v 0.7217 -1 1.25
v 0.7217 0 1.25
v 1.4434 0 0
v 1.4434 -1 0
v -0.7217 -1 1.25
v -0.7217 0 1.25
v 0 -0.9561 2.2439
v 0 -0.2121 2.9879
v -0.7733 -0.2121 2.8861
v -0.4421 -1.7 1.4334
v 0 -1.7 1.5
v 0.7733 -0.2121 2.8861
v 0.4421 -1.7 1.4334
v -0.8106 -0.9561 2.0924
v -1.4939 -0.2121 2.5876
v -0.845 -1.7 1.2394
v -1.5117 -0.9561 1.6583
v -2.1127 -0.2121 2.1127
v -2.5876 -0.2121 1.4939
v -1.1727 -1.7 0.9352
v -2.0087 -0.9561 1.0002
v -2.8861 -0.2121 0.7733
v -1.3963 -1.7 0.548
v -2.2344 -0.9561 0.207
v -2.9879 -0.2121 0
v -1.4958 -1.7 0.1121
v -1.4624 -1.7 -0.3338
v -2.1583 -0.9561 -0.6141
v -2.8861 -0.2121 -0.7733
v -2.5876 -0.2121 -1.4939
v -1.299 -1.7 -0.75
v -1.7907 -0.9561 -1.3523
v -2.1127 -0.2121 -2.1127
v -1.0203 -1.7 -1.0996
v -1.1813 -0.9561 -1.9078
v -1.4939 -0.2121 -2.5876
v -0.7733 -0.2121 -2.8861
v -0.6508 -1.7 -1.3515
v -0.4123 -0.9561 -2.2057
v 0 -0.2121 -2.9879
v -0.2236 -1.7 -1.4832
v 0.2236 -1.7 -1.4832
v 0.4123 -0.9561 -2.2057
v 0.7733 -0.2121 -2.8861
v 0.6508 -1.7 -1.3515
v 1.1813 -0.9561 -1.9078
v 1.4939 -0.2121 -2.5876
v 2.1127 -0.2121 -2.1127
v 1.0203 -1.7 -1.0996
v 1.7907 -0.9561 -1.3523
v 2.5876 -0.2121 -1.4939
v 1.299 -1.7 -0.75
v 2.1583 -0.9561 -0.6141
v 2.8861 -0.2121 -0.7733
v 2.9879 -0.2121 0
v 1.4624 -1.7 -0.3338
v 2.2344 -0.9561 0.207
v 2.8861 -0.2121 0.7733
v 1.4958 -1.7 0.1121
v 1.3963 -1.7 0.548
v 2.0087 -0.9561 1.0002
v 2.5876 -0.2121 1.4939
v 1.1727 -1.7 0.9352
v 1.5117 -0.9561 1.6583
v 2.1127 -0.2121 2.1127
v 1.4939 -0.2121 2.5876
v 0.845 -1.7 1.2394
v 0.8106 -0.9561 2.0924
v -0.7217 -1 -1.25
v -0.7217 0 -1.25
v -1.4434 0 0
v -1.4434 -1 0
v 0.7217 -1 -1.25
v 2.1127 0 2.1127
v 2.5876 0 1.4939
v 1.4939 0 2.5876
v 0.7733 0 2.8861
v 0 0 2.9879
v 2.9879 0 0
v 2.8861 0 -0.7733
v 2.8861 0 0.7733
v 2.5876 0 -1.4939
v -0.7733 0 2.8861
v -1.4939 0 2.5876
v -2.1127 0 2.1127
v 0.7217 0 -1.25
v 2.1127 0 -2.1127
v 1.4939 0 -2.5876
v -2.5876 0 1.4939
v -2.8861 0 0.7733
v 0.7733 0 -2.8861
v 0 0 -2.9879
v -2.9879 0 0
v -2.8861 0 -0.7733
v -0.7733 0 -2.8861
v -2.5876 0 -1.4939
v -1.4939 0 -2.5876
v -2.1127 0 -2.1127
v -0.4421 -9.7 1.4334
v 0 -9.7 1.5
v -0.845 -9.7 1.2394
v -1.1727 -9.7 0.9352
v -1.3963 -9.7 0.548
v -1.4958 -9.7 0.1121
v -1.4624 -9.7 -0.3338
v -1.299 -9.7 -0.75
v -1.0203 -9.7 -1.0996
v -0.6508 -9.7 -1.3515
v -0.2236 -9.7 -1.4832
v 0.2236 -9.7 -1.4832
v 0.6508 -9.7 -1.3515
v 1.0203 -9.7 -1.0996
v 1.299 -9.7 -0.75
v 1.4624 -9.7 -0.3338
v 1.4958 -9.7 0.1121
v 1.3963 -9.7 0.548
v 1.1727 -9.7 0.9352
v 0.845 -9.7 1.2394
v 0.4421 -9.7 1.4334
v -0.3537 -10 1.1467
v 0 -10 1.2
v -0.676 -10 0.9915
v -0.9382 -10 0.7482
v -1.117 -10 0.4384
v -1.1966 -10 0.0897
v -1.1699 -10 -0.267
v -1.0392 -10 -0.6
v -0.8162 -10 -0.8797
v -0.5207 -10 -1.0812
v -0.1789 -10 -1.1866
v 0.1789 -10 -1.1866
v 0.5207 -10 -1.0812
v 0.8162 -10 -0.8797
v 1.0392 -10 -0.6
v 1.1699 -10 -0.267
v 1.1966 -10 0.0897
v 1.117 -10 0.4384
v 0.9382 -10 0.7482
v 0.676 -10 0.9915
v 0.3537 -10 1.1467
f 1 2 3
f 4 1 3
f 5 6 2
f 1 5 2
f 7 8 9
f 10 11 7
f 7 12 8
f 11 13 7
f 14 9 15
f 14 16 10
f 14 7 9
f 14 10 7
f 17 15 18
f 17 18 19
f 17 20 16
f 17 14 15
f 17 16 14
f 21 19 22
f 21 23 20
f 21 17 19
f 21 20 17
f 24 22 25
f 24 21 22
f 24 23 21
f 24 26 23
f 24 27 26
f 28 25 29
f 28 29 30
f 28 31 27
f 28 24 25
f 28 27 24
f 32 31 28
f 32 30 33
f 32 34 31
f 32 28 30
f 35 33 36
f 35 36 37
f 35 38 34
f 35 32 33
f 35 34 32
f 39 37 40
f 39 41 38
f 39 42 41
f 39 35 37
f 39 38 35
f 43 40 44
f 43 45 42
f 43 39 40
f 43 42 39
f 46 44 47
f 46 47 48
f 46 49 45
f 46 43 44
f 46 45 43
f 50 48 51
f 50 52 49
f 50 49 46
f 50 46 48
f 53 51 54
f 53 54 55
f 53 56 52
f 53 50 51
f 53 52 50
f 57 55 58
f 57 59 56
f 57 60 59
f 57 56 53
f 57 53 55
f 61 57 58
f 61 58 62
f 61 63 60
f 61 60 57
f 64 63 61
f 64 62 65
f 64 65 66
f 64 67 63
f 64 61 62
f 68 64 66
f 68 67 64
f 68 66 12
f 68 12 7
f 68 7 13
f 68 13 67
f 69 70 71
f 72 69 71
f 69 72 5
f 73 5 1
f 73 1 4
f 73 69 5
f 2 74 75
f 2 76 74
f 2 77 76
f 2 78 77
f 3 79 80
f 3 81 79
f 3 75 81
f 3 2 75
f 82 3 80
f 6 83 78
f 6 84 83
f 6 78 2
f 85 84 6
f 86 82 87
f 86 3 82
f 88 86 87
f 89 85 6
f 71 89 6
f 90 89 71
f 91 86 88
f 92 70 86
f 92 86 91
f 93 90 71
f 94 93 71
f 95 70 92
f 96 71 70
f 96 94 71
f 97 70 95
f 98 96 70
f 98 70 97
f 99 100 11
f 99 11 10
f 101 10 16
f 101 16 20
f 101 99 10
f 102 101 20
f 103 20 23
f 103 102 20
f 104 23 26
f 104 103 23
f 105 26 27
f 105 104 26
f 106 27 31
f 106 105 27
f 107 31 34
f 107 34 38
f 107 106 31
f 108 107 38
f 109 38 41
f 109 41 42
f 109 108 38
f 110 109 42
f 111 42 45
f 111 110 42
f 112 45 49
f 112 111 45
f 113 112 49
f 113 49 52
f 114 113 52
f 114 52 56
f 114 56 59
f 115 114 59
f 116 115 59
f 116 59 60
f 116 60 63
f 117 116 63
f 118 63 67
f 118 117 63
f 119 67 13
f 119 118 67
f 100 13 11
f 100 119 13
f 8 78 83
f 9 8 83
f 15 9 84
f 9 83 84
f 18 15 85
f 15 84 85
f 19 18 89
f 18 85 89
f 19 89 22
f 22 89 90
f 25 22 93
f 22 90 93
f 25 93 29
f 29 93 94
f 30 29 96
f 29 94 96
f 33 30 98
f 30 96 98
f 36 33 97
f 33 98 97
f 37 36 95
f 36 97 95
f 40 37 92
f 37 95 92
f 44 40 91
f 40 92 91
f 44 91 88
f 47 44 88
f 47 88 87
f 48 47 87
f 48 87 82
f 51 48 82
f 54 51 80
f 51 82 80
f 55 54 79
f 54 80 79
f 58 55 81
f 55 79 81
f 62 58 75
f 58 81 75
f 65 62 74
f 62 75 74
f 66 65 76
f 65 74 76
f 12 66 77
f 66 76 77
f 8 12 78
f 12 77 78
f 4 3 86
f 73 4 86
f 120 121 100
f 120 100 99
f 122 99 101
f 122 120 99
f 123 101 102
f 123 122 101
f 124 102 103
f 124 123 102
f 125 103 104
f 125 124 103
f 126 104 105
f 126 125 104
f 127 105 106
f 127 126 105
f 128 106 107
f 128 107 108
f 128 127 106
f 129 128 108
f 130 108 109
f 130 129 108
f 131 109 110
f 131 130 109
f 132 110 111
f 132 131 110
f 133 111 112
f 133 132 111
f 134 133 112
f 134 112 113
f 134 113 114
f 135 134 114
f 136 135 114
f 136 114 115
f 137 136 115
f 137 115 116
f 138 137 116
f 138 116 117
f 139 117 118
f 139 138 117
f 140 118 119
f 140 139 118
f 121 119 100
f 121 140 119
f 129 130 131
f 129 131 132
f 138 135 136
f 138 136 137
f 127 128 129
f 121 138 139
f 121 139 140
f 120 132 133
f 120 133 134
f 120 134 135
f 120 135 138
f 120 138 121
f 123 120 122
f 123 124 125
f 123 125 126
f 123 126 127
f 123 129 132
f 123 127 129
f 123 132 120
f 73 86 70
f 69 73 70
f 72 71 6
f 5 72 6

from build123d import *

# Parameters (mm, degrees)
CHAFL_N2_SIZE         = 0.3
CHAFL_N2_SIZE2        = 0.212132034
CHAFL_N3_SIZE         = 0.3
CORTAR_EXTRUIR2_DEPTH = 1


with BuildPart() as part:
    # Croquis1 → Revolución1 (revolve)
    with BuildSketch(Plane.XY, mode=Mode.PRIVATE) as revoluci_n1_sk:
        Polygon((0, 0), (3.2, 0), (1.5, -1.7), (1.5, -10), (0, -10), align=None)
    revolve(revoluci_n1_sk.sketch.rotate(Axis((0, 0, 0), (0, -1, 0)), 90), axis=Axis((0, 0, 0), (0, -1, 0)))

    # Chaflán2
    chafl_n2_edges = [part.edges().sort_by_distance(p)[0] for p in [
        (0, 0, -3.2),
    ]]
    chafl_n2_side = [part.faces().sort_by_distance(p)[0] for p in [
        (0, -0.85, -2.35),
    ]]
    chamfer(chafl_n2_edges, length=CHAFL_N2_SIZE, length2=CHAFL_N2_SIZE2, reference=chafl_n2_side[0])

    # Chaflán3
    chafl_n3_edges = [part.edges().sort_by_distance(p)[0] for p in [
        (0, -10, -1.5),
    ]]
    chamfer(chafl_n3_edges, length=CHAFL_N3_SIZE)

    # Croquis3 → Cortar-Extruir2 (cut)
    with BuildSketch(Plane(origin=(0, 0, 0), x_dir=(1, 0, 0), z_dir=(0, 1, 0))):
        Polygon((-0.721687836, 1.25), (-1.443375673, 0), (-0.721687836, -1.25), (0.721687836, -1.25), (1.443375673, 0), (0.721687836, 1.25), align=None)
    extrude(amount=-CORTAR_EXTRUIR2_DEPTH, mode=Mode.SUBTRACT)


solid = part.part
